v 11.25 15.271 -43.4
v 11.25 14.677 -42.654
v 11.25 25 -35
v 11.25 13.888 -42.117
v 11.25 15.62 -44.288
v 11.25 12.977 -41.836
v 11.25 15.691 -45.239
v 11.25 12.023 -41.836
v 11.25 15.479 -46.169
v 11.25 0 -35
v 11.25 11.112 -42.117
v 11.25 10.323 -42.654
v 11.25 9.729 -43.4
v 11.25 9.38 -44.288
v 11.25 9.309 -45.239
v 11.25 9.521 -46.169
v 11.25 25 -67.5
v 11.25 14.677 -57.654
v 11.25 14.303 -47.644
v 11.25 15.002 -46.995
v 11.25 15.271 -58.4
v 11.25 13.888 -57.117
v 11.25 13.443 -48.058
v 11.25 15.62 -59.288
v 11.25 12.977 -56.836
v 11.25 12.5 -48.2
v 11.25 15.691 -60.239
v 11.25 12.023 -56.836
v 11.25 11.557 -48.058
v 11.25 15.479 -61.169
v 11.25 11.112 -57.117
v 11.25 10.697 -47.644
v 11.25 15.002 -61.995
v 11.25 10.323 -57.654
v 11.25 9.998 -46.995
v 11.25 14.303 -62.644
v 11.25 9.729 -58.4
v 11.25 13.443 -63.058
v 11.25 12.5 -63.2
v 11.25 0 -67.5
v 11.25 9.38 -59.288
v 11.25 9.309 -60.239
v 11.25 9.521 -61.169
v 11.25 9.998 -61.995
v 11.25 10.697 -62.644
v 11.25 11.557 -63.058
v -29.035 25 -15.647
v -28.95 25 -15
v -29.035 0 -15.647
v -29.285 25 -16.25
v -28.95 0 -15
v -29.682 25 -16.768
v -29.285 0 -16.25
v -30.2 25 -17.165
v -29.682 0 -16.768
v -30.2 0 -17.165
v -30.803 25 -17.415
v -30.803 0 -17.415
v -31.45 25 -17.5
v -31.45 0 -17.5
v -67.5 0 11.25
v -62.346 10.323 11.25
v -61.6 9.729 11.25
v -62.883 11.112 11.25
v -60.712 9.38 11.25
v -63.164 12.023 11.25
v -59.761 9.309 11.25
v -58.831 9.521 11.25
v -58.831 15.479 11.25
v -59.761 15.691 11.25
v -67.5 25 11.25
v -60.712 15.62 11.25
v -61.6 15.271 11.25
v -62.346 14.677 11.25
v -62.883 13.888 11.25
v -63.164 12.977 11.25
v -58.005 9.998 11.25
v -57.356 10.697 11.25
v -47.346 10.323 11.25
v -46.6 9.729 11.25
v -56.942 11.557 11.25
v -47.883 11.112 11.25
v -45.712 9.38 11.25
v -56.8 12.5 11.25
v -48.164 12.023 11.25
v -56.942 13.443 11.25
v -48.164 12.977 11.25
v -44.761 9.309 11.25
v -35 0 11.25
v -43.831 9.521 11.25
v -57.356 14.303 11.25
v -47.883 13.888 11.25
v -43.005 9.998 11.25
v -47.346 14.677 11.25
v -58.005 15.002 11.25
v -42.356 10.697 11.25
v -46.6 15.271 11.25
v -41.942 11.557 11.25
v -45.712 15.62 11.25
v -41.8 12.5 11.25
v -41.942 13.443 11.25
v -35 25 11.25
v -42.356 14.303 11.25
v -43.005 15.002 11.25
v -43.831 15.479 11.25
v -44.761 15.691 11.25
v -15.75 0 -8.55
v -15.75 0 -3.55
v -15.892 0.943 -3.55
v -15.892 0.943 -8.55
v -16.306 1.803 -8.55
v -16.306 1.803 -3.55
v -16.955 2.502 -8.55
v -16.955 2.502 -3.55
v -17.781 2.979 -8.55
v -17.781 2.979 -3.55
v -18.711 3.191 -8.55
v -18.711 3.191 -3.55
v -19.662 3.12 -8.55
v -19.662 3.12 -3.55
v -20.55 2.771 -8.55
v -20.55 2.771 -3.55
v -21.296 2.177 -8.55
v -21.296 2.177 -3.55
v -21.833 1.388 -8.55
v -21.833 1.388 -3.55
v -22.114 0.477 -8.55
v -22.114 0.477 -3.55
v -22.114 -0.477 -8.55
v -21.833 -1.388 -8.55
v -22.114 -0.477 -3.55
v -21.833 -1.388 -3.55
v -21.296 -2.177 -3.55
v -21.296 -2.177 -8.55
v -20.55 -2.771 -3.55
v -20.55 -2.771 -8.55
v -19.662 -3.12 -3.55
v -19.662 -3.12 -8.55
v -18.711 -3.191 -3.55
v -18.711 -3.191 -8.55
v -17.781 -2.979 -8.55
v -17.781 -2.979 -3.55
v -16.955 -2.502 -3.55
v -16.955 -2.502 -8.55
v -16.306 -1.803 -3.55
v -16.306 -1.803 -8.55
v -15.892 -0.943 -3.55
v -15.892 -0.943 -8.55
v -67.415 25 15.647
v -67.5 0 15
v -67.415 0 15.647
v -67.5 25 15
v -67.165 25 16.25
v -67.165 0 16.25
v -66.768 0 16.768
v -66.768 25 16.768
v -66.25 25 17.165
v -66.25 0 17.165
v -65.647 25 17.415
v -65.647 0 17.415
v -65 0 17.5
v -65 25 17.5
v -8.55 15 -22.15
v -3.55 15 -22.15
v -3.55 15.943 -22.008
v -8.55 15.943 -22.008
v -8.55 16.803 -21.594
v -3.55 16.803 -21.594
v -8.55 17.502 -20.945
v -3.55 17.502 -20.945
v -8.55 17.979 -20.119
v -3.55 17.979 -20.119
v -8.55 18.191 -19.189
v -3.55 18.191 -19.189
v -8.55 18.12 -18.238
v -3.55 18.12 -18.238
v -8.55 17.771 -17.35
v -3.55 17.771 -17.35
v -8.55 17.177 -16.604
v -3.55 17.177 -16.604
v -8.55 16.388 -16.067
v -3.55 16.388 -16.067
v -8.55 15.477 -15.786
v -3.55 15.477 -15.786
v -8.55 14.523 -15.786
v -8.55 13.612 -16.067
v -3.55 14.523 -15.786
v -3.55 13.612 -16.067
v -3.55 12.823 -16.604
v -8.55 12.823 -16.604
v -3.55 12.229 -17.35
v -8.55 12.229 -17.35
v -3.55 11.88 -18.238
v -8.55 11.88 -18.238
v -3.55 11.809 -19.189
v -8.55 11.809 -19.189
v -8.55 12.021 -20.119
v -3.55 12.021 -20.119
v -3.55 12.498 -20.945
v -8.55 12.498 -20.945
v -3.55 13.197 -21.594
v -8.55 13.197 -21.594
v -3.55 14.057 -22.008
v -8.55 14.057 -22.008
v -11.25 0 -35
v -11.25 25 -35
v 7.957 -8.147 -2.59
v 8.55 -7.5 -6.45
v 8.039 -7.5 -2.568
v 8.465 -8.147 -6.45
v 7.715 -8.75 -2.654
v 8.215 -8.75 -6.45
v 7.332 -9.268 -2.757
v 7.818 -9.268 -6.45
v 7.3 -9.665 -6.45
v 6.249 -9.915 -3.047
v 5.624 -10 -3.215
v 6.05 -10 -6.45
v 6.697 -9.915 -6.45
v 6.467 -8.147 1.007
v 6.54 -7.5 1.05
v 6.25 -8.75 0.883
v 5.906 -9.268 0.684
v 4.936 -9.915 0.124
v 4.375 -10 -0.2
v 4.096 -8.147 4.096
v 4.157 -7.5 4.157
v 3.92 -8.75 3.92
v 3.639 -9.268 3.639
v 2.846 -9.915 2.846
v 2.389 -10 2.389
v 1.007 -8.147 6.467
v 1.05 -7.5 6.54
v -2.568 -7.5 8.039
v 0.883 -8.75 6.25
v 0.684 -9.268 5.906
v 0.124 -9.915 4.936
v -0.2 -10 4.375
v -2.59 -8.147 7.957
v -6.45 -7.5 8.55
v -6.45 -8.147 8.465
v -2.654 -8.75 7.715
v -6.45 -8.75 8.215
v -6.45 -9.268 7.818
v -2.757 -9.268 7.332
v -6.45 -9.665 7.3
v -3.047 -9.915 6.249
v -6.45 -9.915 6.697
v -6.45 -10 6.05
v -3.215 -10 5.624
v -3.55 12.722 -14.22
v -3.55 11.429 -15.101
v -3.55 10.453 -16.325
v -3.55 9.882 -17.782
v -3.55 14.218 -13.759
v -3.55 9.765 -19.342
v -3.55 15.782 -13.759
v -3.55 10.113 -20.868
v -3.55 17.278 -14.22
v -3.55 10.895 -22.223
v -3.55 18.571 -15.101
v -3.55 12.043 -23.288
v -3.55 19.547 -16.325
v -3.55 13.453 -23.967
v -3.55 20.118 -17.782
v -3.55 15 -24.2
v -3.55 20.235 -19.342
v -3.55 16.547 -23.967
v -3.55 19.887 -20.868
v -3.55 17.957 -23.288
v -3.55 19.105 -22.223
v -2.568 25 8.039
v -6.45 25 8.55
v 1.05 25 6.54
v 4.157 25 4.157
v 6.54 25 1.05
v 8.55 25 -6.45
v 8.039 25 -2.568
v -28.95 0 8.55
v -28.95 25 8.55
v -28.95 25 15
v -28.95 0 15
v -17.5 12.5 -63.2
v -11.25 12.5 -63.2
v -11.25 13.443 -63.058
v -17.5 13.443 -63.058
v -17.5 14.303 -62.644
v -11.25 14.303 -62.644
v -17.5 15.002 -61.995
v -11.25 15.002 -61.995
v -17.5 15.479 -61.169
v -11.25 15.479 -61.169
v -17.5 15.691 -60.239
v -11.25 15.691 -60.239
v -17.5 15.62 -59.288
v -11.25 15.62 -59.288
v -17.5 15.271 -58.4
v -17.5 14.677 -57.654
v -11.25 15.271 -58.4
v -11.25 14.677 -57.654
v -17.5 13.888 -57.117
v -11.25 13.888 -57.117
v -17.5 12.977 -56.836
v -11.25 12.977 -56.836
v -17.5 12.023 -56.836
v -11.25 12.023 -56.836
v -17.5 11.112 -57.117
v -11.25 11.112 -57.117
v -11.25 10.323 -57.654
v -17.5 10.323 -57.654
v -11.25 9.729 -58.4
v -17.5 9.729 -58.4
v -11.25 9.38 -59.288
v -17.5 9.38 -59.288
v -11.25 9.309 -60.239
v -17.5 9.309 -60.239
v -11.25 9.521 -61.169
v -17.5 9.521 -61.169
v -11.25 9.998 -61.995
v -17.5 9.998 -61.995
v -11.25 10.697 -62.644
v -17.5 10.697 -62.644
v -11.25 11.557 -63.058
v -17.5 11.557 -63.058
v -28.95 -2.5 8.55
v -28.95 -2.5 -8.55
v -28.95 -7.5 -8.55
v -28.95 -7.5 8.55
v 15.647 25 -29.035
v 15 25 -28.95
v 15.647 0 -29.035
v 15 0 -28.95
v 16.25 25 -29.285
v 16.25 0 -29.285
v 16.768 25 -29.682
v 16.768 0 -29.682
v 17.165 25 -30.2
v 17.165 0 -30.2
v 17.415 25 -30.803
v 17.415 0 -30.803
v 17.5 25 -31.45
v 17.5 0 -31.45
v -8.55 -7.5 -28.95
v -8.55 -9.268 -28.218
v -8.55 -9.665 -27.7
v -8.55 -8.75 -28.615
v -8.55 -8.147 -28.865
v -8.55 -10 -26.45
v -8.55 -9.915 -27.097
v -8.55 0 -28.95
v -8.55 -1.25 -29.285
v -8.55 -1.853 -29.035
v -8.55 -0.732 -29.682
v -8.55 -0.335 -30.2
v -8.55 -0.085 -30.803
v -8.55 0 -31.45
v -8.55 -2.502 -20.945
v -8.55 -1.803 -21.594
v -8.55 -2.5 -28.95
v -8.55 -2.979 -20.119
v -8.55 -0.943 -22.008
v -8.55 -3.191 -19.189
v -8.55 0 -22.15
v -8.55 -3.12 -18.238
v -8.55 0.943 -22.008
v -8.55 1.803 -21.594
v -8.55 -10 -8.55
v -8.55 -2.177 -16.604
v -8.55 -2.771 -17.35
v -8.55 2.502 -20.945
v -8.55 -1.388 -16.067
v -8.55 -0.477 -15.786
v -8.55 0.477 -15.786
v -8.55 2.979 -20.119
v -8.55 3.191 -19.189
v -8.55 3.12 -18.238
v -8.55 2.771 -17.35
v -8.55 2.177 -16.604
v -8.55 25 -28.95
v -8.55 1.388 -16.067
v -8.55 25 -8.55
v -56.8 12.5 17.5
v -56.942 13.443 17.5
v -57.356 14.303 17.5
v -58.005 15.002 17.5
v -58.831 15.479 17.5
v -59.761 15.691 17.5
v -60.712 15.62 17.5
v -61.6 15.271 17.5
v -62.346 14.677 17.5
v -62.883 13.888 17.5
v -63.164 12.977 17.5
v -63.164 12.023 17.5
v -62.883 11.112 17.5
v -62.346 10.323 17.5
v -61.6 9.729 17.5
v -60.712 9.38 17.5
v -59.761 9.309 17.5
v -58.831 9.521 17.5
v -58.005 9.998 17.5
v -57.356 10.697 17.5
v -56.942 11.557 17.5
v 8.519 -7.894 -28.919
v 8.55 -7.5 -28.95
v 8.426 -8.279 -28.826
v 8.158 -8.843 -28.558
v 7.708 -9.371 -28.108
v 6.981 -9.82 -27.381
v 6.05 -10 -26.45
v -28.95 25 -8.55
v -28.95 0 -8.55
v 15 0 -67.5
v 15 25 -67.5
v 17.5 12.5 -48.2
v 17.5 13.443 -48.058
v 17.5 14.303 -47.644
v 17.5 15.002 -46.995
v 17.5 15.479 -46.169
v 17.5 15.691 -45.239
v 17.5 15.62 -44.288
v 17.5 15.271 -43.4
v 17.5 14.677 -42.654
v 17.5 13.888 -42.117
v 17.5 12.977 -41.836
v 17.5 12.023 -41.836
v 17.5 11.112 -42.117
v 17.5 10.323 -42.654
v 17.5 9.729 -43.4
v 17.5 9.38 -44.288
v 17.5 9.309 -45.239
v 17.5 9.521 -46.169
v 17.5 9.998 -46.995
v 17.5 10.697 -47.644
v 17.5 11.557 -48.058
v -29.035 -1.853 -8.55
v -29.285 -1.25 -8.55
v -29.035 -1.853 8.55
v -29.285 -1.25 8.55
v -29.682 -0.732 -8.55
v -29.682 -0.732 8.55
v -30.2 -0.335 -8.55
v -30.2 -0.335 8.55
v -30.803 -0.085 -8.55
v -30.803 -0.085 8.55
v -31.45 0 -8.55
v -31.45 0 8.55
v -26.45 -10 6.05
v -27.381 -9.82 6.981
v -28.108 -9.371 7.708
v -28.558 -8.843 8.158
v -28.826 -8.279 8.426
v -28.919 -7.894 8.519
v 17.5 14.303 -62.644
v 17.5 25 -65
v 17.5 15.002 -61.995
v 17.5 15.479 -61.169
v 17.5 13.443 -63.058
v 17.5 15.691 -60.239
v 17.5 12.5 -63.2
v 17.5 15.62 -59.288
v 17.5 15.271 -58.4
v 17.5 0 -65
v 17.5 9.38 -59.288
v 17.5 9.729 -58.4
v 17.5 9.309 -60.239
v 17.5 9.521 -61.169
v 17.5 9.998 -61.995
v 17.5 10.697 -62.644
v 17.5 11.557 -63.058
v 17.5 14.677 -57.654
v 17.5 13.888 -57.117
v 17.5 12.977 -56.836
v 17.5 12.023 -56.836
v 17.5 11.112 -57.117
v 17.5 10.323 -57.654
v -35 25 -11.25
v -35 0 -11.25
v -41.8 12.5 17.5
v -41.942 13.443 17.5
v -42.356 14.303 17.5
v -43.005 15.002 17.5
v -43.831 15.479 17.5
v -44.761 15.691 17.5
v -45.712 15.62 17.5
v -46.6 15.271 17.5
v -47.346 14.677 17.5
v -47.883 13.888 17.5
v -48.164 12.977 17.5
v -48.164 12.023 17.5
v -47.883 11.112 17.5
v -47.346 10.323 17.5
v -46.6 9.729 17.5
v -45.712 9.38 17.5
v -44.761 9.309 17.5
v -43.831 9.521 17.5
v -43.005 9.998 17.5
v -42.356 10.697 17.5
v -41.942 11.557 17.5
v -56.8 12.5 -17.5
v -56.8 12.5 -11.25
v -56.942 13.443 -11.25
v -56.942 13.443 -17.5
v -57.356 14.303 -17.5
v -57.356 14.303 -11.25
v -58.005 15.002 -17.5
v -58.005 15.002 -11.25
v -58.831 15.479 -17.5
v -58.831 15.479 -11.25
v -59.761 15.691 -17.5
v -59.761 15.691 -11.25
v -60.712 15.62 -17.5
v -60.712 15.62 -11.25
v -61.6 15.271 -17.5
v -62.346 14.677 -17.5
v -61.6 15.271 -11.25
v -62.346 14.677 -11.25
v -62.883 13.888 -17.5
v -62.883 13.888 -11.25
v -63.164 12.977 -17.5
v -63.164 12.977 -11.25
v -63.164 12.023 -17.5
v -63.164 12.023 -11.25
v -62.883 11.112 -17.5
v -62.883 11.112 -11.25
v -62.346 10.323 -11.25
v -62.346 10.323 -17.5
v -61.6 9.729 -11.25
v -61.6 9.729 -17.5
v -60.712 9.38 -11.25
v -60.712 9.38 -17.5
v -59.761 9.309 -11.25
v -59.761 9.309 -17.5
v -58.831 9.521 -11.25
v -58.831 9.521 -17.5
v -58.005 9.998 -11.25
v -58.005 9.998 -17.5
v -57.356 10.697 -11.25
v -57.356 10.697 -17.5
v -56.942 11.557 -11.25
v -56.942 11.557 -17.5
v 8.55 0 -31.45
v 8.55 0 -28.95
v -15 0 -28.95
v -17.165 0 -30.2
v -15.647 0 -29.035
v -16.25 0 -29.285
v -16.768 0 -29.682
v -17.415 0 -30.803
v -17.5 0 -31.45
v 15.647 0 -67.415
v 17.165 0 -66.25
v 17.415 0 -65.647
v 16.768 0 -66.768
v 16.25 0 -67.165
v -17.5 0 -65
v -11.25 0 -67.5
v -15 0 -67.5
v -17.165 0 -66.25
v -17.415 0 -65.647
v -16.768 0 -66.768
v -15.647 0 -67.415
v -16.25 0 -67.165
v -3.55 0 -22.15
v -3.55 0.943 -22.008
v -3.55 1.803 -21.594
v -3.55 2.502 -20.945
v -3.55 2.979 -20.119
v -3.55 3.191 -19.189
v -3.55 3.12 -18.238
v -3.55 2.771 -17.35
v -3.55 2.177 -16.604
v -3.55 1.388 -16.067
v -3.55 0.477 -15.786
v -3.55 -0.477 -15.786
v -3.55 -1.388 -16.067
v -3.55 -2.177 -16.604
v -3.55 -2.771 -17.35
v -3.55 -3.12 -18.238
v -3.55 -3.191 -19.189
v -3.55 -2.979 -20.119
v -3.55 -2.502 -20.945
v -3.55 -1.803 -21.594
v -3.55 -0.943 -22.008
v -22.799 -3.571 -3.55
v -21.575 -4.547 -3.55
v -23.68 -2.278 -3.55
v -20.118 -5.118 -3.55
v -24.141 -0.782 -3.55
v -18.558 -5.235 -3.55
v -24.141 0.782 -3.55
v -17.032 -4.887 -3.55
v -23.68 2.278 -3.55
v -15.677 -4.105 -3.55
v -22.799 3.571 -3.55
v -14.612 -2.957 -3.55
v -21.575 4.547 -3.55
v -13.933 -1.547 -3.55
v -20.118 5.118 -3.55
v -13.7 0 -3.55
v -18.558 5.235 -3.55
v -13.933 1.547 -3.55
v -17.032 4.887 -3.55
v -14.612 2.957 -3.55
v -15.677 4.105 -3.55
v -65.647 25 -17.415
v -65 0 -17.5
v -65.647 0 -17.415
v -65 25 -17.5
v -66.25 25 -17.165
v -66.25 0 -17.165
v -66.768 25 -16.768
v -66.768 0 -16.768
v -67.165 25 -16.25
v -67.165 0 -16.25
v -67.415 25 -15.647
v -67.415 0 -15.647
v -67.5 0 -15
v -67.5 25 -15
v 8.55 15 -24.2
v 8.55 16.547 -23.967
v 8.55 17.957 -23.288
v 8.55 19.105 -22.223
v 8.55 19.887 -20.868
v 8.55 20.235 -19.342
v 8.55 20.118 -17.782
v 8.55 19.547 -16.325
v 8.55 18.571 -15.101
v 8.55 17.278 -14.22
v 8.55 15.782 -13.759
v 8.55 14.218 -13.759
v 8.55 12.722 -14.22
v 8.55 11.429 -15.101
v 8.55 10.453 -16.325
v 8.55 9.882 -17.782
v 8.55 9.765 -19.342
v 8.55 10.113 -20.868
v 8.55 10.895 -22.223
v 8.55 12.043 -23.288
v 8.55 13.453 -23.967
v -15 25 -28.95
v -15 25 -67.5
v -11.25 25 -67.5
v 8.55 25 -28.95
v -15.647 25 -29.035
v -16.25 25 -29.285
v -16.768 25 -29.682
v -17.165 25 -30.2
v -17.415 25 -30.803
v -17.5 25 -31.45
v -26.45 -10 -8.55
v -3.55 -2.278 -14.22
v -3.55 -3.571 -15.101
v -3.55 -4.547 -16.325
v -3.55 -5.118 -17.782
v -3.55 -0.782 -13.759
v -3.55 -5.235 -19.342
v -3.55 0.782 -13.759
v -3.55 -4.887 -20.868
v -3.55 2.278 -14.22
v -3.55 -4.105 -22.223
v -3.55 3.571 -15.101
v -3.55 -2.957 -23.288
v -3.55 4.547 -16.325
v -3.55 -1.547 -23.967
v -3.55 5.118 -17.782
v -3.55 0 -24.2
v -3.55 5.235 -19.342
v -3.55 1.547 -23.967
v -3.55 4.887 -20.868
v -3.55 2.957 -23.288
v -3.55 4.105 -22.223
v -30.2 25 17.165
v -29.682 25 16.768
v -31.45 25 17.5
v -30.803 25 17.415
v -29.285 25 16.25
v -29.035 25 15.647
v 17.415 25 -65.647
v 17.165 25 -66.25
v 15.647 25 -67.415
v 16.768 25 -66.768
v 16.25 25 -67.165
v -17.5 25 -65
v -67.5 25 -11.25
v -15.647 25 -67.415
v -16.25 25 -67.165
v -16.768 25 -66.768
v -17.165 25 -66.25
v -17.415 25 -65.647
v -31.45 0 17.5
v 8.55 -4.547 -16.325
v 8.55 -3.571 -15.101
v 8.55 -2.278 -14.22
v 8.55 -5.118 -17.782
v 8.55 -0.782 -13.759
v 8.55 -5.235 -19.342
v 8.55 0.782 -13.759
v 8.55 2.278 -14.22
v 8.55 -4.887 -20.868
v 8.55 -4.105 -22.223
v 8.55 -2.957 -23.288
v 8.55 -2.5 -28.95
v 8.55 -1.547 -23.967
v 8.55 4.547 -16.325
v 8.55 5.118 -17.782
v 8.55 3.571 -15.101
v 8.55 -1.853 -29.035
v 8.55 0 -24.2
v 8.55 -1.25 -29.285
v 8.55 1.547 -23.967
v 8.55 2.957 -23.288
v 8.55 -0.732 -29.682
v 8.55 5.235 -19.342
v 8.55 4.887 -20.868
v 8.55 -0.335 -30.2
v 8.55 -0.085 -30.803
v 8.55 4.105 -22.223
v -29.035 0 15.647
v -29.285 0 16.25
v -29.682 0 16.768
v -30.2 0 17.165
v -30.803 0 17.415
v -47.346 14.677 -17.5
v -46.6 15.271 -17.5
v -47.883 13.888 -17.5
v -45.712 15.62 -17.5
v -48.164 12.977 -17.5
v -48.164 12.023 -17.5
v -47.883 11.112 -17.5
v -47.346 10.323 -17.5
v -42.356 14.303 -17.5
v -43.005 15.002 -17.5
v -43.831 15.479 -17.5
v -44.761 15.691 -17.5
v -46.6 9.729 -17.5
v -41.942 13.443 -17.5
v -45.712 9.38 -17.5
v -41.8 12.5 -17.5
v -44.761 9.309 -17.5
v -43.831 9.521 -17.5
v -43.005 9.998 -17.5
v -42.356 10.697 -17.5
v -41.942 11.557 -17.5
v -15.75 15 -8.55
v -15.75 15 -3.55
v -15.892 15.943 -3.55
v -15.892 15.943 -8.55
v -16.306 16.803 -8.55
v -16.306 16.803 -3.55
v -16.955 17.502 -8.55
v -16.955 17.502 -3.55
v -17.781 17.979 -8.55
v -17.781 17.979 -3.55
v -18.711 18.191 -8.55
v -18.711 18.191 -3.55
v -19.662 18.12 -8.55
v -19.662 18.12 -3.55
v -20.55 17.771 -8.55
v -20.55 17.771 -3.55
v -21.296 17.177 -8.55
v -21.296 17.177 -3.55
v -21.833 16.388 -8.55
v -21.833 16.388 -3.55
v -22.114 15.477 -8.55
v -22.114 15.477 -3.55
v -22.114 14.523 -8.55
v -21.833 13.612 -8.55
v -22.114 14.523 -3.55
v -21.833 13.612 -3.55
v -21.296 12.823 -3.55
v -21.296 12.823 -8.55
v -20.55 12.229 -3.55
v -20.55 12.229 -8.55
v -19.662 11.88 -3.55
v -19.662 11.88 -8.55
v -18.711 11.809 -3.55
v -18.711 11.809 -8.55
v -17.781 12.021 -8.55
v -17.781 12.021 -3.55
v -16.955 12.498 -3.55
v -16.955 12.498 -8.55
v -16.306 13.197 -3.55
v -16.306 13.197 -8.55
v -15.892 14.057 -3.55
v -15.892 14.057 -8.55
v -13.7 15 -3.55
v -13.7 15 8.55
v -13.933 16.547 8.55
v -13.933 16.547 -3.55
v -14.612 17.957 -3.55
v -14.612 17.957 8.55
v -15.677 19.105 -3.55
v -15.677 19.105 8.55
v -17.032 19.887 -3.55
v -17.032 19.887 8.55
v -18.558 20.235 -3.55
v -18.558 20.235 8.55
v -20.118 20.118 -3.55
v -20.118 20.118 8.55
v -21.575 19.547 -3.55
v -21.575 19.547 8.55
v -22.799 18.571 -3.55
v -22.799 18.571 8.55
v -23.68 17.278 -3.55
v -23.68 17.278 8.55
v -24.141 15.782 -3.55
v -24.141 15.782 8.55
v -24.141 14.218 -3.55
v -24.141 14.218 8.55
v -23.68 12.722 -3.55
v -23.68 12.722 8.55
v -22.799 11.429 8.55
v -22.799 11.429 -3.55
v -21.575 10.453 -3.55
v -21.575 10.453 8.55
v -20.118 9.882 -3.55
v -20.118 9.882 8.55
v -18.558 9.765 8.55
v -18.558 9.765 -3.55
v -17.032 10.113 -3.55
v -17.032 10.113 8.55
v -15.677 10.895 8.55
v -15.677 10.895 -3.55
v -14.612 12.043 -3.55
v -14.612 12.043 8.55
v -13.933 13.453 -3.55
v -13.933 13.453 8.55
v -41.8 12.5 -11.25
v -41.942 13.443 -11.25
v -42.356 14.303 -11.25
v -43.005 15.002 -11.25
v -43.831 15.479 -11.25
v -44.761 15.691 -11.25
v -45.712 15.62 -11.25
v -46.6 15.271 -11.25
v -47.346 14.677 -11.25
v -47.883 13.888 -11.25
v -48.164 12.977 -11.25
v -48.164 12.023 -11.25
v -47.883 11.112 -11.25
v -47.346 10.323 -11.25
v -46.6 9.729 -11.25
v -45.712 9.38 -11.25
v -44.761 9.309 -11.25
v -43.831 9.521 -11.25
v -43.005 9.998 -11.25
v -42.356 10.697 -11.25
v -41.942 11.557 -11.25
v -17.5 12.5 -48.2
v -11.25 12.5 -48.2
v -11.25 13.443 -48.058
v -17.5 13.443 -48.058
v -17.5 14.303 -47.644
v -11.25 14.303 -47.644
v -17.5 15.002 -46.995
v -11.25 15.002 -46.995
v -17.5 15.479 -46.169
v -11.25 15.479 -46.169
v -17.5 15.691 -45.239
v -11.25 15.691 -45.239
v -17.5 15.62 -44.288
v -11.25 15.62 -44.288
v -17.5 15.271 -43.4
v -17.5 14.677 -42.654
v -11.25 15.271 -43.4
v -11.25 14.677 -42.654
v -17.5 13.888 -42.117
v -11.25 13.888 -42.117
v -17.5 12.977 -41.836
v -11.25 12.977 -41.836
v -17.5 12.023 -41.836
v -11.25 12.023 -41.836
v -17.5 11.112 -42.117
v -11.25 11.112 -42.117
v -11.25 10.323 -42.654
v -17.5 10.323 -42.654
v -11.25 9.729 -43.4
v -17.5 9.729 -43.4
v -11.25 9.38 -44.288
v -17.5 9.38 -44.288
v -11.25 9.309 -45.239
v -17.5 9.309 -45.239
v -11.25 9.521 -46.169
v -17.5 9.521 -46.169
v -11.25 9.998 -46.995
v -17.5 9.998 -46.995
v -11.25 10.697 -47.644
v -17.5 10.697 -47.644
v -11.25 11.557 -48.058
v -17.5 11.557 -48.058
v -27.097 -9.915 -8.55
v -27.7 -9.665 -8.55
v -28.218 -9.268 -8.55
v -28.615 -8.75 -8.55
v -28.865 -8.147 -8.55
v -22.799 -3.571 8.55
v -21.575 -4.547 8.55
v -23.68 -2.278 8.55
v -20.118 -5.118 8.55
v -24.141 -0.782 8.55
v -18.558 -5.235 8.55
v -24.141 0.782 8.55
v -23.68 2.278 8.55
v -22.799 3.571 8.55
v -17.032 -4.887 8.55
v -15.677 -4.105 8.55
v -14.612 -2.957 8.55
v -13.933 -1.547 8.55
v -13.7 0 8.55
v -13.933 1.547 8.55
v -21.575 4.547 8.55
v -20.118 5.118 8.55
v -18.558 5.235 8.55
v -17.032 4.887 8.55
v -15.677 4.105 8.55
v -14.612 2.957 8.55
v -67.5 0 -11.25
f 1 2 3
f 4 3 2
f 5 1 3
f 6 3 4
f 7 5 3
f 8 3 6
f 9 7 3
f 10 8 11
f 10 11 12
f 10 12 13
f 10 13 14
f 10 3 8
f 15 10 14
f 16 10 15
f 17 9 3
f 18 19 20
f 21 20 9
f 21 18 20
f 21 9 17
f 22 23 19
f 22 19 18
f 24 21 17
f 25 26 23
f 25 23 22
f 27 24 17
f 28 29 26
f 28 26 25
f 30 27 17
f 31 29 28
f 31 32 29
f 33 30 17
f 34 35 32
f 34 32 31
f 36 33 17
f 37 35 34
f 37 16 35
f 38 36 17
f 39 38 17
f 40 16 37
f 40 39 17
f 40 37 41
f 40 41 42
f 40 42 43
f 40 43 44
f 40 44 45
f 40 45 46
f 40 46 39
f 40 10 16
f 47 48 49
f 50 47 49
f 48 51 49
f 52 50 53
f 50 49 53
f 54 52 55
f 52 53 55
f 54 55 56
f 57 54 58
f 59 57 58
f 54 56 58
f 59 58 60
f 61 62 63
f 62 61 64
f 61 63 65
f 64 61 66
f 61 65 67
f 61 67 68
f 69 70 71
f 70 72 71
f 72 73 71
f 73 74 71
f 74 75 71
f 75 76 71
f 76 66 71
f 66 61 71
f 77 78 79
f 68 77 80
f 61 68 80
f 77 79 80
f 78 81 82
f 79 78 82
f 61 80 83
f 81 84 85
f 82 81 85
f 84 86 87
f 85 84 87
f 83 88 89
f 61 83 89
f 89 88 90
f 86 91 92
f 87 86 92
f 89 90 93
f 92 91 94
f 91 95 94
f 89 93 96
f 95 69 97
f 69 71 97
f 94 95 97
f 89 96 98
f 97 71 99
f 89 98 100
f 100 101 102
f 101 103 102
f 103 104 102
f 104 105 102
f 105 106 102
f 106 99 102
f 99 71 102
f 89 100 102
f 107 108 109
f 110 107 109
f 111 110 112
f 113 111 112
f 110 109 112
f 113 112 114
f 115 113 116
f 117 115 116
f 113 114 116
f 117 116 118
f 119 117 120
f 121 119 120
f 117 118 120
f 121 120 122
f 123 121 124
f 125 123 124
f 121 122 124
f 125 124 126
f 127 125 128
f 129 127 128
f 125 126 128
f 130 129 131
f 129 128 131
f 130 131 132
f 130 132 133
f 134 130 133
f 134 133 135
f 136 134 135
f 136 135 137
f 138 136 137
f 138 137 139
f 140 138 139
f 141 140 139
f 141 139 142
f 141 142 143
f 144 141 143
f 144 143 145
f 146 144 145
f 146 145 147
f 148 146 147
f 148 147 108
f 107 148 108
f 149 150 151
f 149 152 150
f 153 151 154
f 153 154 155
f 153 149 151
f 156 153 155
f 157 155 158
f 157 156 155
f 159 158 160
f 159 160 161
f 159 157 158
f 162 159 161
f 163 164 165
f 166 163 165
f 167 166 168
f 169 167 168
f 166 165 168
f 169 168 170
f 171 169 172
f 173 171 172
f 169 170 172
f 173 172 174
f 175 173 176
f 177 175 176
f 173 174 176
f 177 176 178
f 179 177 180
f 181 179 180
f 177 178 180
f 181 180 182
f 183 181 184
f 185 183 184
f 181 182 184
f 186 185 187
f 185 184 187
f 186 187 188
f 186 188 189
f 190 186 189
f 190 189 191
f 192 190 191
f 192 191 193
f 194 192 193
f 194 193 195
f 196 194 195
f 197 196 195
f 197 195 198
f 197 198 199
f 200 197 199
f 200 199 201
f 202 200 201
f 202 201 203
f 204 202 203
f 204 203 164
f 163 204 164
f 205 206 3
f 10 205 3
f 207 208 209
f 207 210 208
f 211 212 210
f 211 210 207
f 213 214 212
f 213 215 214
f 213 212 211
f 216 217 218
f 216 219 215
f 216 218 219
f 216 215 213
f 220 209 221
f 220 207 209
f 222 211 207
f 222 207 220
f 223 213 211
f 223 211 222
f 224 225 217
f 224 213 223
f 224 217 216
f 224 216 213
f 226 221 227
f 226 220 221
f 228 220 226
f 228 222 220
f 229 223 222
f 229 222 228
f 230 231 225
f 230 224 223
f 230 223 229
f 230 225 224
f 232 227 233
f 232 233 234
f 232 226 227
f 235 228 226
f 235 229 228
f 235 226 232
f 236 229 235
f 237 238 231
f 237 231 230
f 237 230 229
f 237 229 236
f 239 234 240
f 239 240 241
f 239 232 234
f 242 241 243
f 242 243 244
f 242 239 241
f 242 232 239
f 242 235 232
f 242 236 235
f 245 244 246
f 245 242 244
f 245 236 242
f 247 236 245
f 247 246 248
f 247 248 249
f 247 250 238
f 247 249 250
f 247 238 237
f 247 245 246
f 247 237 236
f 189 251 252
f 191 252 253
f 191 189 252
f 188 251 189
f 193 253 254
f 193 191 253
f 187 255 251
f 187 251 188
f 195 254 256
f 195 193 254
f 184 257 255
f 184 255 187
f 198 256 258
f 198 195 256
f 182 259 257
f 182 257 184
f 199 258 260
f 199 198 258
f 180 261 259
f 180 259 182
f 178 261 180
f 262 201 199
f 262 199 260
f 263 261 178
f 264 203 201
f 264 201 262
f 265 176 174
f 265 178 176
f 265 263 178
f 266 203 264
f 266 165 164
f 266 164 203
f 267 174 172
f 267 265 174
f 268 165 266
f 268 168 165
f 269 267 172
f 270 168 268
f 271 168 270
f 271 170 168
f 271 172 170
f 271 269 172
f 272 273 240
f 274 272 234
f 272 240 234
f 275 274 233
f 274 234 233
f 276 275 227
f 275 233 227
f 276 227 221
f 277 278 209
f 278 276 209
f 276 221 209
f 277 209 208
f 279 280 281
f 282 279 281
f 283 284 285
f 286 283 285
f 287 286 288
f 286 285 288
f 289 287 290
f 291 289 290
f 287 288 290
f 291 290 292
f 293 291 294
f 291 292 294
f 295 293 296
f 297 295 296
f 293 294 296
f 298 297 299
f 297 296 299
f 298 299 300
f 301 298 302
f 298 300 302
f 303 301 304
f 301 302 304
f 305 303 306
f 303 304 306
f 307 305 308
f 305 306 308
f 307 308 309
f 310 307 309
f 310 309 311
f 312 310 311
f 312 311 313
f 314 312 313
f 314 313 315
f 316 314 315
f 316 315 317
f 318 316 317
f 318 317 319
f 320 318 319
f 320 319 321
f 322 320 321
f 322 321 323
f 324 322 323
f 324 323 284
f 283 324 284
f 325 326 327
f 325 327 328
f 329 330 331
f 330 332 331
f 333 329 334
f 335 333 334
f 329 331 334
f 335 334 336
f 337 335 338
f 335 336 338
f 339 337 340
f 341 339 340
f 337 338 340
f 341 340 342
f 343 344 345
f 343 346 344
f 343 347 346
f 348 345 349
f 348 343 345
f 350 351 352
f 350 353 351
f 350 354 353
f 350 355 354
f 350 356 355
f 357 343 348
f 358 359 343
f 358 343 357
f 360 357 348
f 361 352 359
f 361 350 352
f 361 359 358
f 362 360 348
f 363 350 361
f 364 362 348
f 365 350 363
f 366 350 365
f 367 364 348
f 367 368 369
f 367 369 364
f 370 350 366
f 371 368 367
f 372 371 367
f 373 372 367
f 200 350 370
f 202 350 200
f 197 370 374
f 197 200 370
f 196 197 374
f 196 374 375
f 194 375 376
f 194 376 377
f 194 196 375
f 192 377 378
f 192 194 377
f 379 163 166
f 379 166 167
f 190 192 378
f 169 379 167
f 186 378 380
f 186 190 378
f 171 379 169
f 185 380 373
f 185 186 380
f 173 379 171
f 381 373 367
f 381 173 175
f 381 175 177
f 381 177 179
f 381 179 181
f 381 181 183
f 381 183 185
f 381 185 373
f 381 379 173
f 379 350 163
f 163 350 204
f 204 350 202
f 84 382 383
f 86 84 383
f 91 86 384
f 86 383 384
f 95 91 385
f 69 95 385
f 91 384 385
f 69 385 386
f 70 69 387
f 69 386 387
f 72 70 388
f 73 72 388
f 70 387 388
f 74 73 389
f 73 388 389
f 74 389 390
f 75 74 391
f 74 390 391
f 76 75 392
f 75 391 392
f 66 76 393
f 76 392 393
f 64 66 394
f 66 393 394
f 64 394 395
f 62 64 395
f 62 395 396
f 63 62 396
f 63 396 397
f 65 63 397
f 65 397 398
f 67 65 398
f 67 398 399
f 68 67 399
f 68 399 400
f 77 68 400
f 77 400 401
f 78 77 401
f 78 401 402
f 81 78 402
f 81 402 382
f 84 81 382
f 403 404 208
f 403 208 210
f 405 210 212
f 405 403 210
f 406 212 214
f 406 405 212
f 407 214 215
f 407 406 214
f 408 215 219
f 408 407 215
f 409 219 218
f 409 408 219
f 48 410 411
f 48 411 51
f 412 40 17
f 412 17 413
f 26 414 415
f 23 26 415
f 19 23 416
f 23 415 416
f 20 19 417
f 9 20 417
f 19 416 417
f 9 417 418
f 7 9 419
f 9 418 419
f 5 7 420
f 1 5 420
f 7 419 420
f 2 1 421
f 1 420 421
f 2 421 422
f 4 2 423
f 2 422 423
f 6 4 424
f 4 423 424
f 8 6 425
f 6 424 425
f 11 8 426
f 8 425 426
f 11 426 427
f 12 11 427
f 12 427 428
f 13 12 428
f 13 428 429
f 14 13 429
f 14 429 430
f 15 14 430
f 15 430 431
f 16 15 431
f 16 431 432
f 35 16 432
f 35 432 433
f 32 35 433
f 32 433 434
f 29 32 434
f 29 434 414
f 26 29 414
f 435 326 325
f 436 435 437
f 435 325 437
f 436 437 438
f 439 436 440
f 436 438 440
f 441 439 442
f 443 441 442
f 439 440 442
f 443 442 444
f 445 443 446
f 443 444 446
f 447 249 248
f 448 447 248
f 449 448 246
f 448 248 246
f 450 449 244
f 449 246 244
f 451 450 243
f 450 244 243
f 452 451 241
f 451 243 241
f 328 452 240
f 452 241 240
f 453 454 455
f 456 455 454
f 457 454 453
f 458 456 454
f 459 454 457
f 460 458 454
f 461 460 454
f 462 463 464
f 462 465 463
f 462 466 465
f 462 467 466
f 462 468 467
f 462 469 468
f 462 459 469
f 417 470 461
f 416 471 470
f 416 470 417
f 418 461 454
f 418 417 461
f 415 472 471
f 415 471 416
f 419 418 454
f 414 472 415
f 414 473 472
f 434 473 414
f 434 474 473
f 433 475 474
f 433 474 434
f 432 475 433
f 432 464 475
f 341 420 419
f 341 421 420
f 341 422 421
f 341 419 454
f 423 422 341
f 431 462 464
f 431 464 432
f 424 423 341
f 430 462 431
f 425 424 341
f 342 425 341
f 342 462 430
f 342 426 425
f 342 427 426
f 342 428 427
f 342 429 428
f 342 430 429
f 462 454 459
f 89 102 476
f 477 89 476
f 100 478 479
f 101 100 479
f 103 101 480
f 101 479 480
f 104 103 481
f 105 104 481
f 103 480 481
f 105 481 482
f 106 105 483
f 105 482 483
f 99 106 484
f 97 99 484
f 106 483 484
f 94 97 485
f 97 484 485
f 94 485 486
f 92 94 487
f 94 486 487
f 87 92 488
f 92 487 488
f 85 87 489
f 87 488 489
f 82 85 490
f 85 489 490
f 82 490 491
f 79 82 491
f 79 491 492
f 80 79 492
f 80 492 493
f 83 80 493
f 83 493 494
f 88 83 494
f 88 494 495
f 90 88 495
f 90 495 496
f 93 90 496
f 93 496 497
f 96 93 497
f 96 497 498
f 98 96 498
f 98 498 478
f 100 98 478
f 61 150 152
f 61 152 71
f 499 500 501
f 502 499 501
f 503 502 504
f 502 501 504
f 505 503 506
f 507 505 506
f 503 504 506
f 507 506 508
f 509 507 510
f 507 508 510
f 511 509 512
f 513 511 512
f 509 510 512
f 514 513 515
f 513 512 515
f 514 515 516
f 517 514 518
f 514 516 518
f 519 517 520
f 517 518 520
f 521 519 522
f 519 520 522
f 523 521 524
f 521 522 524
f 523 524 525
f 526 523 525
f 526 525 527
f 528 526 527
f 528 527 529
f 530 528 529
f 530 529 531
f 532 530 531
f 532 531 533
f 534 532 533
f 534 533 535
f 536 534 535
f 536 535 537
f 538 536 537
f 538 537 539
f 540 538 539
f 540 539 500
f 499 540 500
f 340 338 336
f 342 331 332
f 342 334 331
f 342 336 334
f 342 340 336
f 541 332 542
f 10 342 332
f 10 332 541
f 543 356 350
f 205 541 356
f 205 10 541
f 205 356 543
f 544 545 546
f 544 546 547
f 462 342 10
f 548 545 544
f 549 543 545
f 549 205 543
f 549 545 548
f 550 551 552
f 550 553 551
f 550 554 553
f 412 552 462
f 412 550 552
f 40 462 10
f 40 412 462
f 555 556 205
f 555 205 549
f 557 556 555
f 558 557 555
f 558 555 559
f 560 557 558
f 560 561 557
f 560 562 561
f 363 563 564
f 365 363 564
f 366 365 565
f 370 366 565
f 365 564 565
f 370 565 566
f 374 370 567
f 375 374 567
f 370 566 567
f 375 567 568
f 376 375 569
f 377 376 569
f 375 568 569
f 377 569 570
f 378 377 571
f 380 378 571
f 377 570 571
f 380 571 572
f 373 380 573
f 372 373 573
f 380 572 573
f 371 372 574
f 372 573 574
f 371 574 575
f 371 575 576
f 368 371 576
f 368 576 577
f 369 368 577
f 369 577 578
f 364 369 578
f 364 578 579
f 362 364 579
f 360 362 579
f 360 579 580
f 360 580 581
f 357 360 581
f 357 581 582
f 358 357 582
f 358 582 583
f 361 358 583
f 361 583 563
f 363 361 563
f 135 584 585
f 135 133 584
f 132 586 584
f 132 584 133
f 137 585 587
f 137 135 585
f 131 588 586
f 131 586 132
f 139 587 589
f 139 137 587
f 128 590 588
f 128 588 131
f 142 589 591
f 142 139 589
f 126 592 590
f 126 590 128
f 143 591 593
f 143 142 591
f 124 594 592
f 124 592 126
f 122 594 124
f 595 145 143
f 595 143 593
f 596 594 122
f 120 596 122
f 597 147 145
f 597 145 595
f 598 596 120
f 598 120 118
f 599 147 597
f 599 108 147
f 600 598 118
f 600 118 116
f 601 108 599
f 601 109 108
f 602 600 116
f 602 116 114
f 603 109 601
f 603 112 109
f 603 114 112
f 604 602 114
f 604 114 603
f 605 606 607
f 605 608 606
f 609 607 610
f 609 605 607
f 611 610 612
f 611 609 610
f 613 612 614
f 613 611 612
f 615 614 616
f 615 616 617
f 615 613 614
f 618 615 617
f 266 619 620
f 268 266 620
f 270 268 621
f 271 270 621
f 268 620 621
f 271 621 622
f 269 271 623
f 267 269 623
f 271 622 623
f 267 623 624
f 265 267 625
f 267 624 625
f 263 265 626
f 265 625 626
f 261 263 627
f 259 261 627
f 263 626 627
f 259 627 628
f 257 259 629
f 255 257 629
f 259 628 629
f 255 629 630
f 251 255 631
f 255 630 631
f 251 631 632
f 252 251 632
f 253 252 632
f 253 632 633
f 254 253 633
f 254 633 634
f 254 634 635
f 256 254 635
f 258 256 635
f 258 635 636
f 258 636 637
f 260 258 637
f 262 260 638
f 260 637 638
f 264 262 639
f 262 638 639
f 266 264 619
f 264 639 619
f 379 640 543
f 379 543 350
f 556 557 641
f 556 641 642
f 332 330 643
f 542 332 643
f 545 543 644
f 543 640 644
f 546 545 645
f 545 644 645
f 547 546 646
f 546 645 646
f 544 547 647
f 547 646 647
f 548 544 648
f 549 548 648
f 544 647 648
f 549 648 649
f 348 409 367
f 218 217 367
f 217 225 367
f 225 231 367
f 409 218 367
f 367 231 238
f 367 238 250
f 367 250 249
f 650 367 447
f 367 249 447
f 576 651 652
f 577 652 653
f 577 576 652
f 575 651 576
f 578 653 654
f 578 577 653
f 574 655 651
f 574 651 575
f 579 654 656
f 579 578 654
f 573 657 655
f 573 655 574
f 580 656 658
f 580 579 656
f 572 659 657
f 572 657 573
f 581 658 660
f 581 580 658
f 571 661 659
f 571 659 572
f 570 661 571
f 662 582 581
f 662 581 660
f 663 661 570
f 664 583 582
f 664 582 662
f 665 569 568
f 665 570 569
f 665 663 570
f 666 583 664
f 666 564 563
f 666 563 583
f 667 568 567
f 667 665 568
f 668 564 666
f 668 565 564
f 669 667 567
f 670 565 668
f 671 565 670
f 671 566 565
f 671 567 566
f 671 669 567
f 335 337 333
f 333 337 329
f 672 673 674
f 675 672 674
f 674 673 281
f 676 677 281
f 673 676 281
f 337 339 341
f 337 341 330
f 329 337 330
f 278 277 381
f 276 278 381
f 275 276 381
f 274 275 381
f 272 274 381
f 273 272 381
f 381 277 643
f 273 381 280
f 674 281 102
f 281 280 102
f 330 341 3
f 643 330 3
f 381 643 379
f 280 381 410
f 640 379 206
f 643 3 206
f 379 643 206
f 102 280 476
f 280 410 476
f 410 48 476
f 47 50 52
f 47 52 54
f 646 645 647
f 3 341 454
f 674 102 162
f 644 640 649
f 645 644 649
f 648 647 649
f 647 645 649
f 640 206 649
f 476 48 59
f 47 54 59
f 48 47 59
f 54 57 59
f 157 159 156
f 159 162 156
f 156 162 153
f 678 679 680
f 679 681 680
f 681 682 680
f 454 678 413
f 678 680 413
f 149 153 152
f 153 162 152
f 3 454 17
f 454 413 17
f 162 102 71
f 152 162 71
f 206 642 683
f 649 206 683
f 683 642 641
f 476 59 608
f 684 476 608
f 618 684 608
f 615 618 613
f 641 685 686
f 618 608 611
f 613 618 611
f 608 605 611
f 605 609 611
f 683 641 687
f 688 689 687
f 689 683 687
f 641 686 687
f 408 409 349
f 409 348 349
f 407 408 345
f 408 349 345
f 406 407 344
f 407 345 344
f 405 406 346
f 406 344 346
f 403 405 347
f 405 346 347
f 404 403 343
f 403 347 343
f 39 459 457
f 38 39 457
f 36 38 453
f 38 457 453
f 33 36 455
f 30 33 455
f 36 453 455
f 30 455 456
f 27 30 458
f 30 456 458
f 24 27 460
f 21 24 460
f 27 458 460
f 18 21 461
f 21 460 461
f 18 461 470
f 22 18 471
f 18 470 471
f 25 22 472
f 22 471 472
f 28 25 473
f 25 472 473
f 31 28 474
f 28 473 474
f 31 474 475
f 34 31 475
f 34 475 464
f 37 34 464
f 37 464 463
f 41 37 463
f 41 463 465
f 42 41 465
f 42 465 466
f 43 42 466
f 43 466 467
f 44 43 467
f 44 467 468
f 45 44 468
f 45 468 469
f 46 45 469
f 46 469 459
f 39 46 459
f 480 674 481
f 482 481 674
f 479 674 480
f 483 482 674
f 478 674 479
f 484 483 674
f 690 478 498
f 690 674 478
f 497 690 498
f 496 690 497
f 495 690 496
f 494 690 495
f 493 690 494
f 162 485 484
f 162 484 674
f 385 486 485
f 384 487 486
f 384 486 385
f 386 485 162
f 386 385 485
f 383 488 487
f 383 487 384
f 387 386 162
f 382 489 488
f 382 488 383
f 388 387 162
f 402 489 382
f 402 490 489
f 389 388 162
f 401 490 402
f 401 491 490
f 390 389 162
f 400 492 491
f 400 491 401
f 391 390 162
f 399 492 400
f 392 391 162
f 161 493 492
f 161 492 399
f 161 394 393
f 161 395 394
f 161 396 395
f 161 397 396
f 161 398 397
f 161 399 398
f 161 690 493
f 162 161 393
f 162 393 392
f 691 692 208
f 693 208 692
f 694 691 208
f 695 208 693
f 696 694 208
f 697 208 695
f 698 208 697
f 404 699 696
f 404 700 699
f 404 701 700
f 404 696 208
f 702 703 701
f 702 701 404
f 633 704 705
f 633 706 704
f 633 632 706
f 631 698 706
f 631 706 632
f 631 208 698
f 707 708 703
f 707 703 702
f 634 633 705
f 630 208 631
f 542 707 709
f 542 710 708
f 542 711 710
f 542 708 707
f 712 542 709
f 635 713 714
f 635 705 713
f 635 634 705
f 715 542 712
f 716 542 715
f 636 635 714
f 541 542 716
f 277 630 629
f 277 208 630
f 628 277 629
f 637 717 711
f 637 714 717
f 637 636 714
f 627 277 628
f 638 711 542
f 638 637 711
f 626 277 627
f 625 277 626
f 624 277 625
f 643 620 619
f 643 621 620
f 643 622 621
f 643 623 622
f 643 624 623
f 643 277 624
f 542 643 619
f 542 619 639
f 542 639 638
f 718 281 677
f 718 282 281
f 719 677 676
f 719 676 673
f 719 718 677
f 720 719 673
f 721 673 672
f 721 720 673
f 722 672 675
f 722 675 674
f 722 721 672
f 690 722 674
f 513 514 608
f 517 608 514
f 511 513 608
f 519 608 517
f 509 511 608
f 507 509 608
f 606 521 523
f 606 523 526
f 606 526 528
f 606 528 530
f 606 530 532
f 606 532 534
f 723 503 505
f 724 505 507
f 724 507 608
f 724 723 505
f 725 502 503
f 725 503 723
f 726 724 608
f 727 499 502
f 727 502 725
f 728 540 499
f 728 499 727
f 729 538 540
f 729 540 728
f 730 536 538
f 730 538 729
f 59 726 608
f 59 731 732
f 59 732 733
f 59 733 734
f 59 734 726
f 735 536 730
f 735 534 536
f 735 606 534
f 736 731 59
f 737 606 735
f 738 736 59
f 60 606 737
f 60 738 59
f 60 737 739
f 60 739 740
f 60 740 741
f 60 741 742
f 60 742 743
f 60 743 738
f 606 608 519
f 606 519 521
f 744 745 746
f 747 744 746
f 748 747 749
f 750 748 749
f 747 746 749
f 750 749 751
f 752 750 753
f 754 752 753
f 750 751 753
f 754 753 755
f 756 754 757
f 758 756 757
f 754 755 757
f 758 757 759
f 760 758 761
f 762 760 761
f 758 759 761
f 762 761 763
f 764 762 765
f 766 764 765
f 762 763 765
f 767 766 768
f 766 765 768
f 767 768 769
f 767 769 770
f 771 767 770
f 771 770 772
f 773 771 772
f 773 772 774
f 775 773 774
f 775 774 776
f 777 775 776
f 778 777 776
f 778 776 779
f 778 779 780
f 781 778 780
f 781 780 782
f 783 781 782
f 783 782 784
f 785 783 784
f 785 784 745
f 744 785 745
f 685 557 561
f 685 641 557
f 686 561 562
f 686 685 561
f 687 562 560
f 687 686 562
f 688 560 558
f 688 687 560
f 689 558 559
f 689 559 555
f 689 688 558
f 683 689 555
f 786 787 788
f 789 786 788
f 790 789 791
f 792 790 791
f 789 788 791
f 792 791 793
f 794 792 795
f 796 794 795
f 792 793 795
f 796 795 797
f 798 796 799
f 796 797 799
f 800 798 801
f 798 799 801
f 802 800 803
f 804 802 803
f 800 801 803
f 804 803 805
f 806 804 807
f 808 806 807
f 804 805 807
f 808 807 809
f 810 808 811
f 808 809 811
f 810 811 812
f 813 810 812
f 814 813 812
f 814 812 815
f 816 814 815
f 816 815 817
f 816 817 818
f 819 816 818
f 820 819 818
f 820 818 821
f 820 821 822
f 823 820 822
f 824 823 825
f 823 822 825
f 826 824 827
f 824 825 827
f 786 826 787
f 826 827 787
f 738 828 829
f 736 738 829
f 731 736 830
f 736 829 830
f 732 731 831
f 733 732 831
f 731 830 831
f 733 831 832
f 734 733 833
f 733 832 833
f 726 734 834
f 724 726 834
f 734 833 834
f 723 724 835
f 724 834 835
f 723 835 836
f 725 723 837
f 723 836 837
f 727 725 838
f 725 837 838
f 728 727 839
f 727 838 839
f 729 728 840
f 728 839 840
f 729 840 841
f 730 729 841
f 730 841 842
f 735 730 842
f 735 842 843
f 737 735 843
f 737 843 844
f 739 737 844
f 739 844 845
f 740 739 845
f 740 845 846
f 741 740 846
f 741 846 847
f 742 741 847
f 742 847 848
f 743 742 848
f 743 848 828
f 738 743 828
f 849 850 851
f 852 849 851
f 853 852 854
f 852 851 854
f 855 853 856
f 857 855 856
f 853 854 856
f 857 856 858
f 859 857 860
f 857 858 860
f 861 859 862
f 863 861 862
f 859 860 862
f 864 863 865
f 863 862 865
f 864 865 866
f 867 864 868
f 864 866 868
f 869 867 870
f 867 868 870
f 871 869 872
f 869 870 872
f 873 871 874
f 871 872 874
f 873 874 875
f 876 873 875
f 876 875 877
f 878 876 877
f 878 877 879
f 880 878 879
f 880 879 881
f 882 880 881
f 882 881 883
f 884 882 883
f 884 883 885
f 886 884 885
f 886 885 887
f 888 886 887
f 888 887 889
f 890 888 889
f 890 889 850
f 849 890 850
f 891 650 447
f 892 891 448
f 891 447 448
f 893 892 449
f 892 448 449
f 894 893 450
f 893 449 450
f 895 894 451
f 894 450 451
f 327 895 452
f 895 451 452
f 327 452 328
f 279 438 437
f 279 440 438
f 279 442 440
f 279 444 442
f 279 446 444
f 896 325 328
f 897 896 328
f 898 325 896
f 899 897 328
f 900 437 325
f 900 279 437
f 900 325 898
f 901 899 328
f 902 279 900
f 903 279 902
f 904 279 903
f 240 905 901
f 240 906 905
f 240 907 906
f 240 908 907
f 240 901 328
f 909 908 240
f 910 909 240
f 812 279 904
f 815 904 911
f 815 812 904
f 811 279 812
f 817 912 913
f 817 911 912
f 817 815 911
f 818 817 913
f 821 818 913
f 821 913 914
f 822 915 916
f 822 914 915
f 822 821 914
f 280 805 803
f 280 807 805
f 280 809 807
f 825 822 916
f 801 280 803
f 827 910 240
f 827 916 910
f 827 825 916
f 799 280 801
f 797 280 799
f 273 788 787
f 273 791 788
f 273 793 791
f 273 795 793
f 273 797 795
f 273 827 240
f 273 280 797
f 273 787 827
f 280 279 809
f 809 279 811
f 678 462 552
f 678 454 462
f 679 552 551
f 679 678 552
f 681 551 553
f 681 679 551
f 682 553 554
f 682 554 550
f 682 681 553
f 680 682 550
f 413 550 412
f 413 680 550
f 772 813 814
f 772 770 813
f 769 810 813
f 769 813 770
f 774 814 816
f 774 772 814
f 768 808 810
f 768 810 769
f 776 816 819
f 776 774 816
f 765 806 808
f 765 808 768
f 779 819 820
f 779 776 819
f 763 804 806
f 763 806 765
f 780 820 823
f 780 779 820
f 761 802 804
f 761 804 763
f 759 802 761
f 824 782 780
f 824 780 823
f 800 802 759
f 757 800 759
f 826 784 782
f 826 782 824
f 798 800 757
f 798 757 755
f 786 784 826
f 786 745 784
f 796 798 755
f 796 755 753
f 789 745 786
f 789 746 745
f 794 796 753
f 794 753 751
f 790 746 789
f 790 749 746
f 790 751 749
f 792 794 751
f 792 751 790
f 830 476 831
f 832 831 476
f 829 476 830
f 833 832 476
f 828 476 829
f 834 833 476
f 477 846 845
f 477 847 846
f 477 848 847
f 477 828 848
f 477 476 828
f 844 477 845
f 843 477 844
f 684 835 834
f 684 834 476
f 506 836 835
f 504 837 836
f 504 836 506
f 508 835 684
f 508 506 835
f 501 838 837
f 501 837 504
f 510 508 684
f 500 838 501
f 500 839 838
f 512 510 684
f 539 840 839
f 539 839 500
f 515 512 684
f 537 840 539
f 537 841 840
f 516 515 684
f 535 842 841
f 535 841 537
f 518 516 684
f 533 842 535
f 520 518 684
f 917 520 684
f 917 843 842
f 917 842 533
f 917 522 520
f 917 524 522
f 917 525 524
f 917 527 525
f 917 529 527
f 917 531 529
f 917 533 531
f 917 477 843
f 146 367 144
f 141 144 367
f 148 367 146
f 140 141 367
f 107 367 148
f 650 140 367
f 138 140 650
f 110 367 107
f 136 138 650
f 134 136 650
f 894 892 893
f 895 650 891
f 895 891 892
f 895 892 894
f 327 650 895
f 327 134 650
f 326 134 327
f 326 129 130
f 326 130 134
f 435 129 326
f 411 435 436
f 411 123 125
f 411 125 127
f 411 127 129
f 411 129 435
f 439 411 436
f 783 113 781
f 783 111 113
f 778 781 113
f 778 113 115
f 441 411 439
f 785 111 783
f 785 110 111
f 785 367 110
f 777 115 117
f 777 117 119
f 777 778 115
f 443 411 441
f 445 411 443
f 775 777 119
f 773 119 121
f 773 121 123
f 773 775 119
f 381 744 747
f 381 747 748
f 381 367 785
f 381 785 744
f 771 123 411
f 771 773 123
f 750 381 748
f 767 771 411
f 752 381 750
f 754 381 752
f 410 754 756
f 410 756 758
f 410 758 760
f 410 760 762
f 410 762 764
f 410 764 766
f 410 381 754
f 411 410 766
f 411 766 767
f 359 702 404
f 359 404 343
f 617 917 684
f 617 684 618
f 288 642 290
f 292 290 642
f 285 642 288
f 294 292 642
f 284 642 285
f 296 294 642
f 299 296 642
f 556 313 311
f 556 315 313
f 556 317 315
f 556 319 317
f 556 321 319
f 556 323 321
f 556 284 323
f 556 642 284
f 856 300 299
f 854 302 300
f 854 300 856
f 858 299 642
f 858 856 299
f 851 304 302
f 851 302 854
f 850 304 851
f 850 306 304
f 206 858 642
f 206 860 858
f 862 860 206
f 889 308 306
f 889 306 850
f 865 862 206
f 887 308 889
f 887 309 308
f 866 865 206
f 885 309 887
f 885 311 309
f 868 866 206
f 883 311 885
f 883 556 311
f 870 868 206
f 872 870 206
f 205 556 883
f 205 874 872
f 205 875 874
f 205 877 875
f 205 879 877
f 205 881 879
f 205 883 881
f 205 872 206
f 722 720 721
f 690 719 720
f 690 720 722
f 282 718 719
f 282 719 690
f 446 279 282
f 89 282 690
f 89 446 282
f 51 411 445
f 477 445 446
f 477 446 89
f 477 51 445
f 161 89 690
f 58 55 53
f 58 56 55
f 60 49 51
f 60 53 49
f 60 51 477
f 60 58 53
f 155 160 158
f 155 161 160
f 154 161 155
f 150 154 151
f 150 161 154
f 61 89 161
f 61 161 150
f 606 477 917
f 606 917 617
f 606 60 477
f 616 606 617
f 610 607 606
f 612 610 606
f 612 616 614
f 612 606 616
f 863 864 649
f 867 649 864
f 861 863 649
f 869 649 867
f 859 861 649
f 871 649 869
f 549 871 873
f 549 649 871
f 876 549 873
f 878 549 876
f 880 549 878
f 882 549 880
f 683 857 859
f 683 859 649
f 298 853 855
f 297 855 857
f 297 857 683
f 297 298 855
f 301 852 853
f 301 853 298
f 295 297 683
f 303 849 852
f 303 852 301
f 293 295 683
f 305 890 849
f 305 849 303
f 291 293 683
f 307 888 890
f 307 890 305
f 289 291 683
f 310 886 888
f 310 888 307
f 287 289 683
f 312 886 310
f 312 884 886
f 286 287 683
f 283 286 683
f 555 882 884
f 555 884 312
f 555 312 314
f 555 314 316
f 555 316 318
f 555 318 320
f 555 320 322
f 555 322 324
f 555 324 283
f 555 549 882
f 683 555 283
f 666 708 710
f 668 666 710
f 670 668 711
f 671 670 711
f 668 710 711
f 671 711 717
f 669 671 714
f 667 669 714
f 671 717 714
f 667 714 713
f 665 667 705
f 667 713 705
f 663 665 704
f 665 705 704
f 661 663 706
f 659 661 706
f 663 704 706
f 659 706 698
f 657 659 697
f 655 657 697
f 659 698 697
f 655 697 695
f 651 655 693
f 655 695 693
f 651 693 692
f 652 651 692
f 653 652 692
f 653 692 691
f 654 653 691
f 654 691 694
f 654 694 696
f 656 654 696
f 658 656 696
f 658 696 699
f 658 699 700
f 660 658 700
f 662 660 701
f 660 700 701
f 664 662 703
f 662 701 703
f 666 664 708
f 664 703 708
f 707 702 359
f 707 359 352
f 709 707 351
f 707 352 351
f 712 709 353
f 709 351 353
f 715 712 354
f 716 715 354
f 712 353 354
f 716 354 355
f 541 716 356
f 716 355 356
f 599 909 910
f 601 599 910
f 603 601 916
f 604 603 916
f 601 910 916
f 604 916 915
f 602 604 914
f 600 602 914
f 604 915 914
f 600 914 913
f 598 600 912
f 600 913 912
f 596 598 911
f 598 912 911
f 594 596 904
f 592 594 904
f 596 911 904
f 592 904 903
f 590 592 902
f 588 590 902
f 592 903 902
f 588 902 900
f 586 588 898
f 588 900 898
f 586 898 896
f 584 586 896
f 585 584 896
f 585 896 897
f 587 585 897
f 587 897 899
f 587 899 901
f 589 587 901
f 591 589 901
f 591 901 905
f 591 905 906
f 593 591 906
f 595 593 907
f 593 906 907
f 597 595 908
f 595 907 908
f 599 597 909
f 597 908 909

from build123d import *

# Parameters (mm, degrees)
EXTRUDE_1_DEPTH      = 25
CUT_EXTRUDE_1_REACH  = 113.383
SKETCH_2_R           = 3.2
CUT_EXTRUDE_2_REACH  = 113.383
SKETCH_3_R           = 3.2
SKETCH_14_W          = 22.5
SKETCH_14_H          = 2.5
SKETCH_14_W_2        = 2.5
SKETCH_14_H_2        = 22.5
CUT_EXTRUDE_12_DEPTH = 25
SKETCH_5_W           = 20.4
SKETCH_5_H           = 20.4
CUT_EXTRUDE_7_DEPTH  = 25
EXTRUDE_2_DEPTH      = 10
SKETCH_10_R          = 3.2
CUT_EXTRUDE_8_DEPTH  = 17.1
SKETCH_11_R          = 5.25
CUT_EXTRUDE_9_DEPTH  = 12.1
SKETCH_12_R          = 3.2
CUT_EXTRUDE_10_DEPTH = 17.1
SKETCH_13_R          = 5.25
CUT_EXTRUDE_11_DEPTH = 12.1
FILLET_2_R           = 2.5
FILLET_3_R           = 15
FILLET_5_R           = 2.5


with BuildPart() as part:
    # 스케치1 → 보스-돌출1 (new body)
    with BuildSketch(Plane(origin=(0, 0, 0), x_dir=(1, 0, 0), z_dir=(0, 1, 0))):
        Polygon((-17.5, 67.5), (-11.25, 67.5), (-11.25, 37.5), (11.25, 37.5), (11.25, 67.5), (17.5, 67.5), (17.5, -17.5), (-67.5, -17.5), (-67.5, -11.25), (-37.5, -11.25), (-37.5, 11.25), (-67.5, 11.25), (-67.5, 17.5), (-17.5, 17.5), align=None)
    extrude(amount=EXTRUDE_1_DEPTH)

    # 컷-돌출1: up to this face of the body (flat: up to its plane)
    cut_extrude_1_end = Plane(part.part.faces().sort_by_distance((-17.5, 12.5, -42.5))[0])
    # 스케치2 → 컷-돌출1 (cut, up to the picked face)
    with BuildSketch(Plane(origin=(17.5, 0, 0), x_dir=(0, 0, -1), z_dir=(1, 0, 0)), mode=Mode.PRIVATE) as cut_extrude_1_sk1:
        with Locations((60, 12.5)):
            Circle(SKETCH_2_R)
    cut_extrude_1_tool1 = split(extrude(cut_extrude_1_sk1.sketch, amount=-CUT_EXTRUDE_1_REACH, mode=Mode.PRIVATE), bisect_by=cut_extrude_1_end, keep=Keep.BOTH, mode=Mode.PRIVATE)
    # 스케치2 → 컷-돌출1 (cut, up to the picked face)
    with BuildSketch(Plane(origin=(17.5, 0, 0), x_dir=(0, 0, -1), z_dir=(1, 0, 0)), mode=Mode.PRIVATE) as cut_extrude_1_sk2:
        with Locations((45, 12.5)):
            Circle(SKETCH_2_R)
    cut_extrude_1_tool2 = split(extrude(cut_extrude_1_sk2.sketch, amount=-CUT_EXTRUDE_1_REACH, mode=Mode.PRIVATE), bisect_by=cut_extrude_1_end, keep=Keep.BOTH, mode=Mode.PRIVATE)
    add(cut_extrude_1_tool1.solids().sort_by(Axis((17.5, 12.5, -60), (-1, 0, 0)))[0], mode=Mode.SUBTRACT)
    add(cut_extrude_1_tool2.solids().sort_by(Axis((17.5, 12.5, -45), (-1, 0, 0)))[0], mode=Mode.SUBTRACT)

    # 컷-돌출2: up to this face of the body (flat: up to its plane)
    cut_extrude_2_end = Plane(part.part.faces().sort_by_distance((-42.5, 12.5, -17.5))[0])
    # 스케치3 → 컷-돌출2 (cut, up to the picked face)
    with BuildSketch(Plane.XY.offset(17.5), mode=Mode.PRIVATE) as cut_extrude_2_sk1:
        with Locations((-60, 12.5)):
            Circle(SKETCH_3_R)
    cut_extrude_2_tool1 = split(extrude(cut_extrude_2_sk1.sketch, amount=-CUT_EXTRUDE_2_REACH, mode=Mode.PRIVATE), bisect_by=cut_extrude_2_end, keep=Keep.BOTH, mode=Mode.PRIVATE)
    # 스케치3 → 컷-돌출2 (cut, up to the picked face)
    with BuildSketch(Plane.XY.offset(17.5), mode=Mode.PRIVATE) as cut_extrude_2_sk2:
        with Locations((-45, 12.5)):
            Circle(SKETCH_3_R)
    cut_extrude_2_tool2 = split(extrude(cut_extrude_2_sk2.sketch, amount=-CUT_EXTRUDE_2_REACH, mode=Mode.PRIVATE), bisect_by=cut_extrude_2_end, keep=Keep.BOTH, mode=Mode.PRIVATE)
    add(cut_extrude_2_tool1.solids().sort_by(Axis((-60, 12.5, 17.5), (0, 0, -1)))[0], mode=Mode.SUBTRACT)
    add(cut_extrude_2_tool2.solids().sort_by(Axis((-45, 12.5, 17.5), (0, 0, -1)))[0], mode=Mode.SUBTRACT)

    # 스케치14 → 컷-돌출12 (cut)
    with BuildSketch(Plane(origin=(0, 25, 0), x_dir=(1, 0, 0), z_dir=(0, 1, 0))):
        with Locations((0, 36.25)):
            Rectangle(SKETCH_14_W, SKETCH_14_H)
        with Locations((-36.25, 0)):
            Rectangle(SKETCH_14_W_2, SKETCH_14_H_2)
    extrude(amount=-CUT_EXTRUDE_12_DEPTH, mode=Mode.SUBTRACT)

    # 스케치5 → 컷-돌출7 (cut)
    with BuildSketch(Plane(origin=(0, 25, 0), x_dir=(1, 0, 0), z_dir=(0, 1, 0))):
        with Locations((-18.75, 18.75)):
            Rectangle(SKETCH_5_W, SKETCH_5_H)
        Polygon((-28.95, -8.55), (-28.95, -17.5), (17.5, -17.5), (17.5, 28.95), (8.55, 28.95), (8.55, -8.55), align=None)
    extrude(amount=-CUT_EXTRUDE_7_DEPTH, mode=Mode.SUBTRACT)

    # 스케치15 → 보스-돌출2 (add)
    with BuildSketch(Plane.XZ):
        Polygon((8.55, 8.55), (8.55, -28.95), (-8.55, -28.95), (-8.55, -8.55), (-28.95, -8.55), (-28.95, 8.55), align=None)
    extrude(amount=EXTRUDE_2_DEPTH)

    # 스케치10 → 컷-돌출8 (cut)
    with BuildSketch(Plane.XY.offset(8.55)):
        with Locations((-18.95, 15)):
            Circle(SKETCH_10_R)
        with Locations((-18.95, 0)):
            Circle(SKETCH_10_R)
    extrude(amount=-CUT_EXTRUDE_8_DEPTH, mode=Mode.SUBTRACT)

    # 스케치11 → 컷-돌출9 (cut)
    with BuildSketch(Plane.XY.offset(8.55)):
        with Locations((-18.95, 15)):
            Circle(SKETCH_11_R)
        with Locations((-18.95, 0)):
            Circle(SKETCH_11_R)
    extrude(amount=-CUT_EXTRUDE_9_DEPTH, mode=Mode.SUBTRACT)

    # 스케치12 → 컷-돌출10 (cut)
    with BuildSketch(Plane(origin=(8.55, 0, 0), x_dir=(0, 0, -1), z_dir=(1, 0, 0))):
        with Locations((18.95, 15)):
            Circle(SKETCH_12_R)
        with Locations((18.95, 0)):
            Circle(SKETCH_12_R)
    extrude(amount=-CUT_EXTRUDE_10_DEPTH, mode=Mode.SUBTRACT)

    # 스케치13 → 컷-돌출11 (cut)
    with BuildSketch(Plane(origin=(8.55, 0, 0), x_dir=(0, 0, -1), z_dir=(1, 0, 0))):
        with Locations((18.95, 15)):
            Circle(SKETCH_13_R)
        with Locations((18.95, 0)):
            Circle(SKETCH_13_R)
    extrude(amount=-CUT_EXTRUDE_11_DEPTH, mode=Mode.SUBTRACT)

    # 필렛2
    fillet_2_edges = [part.edges().sort_by_distance(p)[0] for p in [
        (-17.5, 12.5, -28.95),
        (-28.95, 12.5, -17.5),
        (-28.95, 12.5, 17.5),
        (17.5, 12.5, -28.95),
        (-10.2, -10, 8.55),
        (-28.95, -10, 0),
        (0, -10, -28.95),
        (8.55, -10, -10.2),
        (-17.5, 12.5, -67.5),
        (17.5, 12.5, -67.5),
        (-67.5, 12.5, 17.5),
        (-67.5, 12.5, -17.5),
    ]]
    fillet(fillet_2_edges, radius=FILLET_2_R)

    # 필렛3
    # the kernel refuses this fillet: 15 mm, written as the material it takes off along each edge
    with BuildSketch(Plane(origin=(-6.45, -10, -6.45), x_dir=(1, 0, 0), z_dir=(0, 0, -1))) as fillet_3_piece_1:
        with BuildLine():
            CenterArc((12.5, -2.5), 2.5, 0, 90)
            Line((15, -2.5), (15, 0))
            Line((15, 0), (12.5, 0))
        make_face()
    revolve(axis=Axis((-6.45, -10, -6.45), (0, -1, 0)), revolution_arc=90, mode=Mode.SUBTRACT)
    with BuildSketch(Plane(origin=(8.55, -10, 8.55), x_dir=(0, 0, -1), z_dir=(0, 1, 0))) as fillet_3_piece_2:
        with BuildLine():
            CenterArc((FILLET_3_R, FILLET_3_R), FILLET_3_R, 180, 90)
            Line((0, FILLET_3_R), (0, 0))
            Line((0, 0), (FILLET_3_R, 0))
        make_face()
    extrude(amount=72.5, mode=Mode.SUBTRACT)

    # 필렛5
    fillet_5_edges = [part.edges().sort_by_distance(p)[0] for p in [
        (-28.95, 0, 0),
        (0, 0, -28.95),
    ]]
    fillet(fillet_5_edges, radius=FILLET_5_R)


solid = part.part
